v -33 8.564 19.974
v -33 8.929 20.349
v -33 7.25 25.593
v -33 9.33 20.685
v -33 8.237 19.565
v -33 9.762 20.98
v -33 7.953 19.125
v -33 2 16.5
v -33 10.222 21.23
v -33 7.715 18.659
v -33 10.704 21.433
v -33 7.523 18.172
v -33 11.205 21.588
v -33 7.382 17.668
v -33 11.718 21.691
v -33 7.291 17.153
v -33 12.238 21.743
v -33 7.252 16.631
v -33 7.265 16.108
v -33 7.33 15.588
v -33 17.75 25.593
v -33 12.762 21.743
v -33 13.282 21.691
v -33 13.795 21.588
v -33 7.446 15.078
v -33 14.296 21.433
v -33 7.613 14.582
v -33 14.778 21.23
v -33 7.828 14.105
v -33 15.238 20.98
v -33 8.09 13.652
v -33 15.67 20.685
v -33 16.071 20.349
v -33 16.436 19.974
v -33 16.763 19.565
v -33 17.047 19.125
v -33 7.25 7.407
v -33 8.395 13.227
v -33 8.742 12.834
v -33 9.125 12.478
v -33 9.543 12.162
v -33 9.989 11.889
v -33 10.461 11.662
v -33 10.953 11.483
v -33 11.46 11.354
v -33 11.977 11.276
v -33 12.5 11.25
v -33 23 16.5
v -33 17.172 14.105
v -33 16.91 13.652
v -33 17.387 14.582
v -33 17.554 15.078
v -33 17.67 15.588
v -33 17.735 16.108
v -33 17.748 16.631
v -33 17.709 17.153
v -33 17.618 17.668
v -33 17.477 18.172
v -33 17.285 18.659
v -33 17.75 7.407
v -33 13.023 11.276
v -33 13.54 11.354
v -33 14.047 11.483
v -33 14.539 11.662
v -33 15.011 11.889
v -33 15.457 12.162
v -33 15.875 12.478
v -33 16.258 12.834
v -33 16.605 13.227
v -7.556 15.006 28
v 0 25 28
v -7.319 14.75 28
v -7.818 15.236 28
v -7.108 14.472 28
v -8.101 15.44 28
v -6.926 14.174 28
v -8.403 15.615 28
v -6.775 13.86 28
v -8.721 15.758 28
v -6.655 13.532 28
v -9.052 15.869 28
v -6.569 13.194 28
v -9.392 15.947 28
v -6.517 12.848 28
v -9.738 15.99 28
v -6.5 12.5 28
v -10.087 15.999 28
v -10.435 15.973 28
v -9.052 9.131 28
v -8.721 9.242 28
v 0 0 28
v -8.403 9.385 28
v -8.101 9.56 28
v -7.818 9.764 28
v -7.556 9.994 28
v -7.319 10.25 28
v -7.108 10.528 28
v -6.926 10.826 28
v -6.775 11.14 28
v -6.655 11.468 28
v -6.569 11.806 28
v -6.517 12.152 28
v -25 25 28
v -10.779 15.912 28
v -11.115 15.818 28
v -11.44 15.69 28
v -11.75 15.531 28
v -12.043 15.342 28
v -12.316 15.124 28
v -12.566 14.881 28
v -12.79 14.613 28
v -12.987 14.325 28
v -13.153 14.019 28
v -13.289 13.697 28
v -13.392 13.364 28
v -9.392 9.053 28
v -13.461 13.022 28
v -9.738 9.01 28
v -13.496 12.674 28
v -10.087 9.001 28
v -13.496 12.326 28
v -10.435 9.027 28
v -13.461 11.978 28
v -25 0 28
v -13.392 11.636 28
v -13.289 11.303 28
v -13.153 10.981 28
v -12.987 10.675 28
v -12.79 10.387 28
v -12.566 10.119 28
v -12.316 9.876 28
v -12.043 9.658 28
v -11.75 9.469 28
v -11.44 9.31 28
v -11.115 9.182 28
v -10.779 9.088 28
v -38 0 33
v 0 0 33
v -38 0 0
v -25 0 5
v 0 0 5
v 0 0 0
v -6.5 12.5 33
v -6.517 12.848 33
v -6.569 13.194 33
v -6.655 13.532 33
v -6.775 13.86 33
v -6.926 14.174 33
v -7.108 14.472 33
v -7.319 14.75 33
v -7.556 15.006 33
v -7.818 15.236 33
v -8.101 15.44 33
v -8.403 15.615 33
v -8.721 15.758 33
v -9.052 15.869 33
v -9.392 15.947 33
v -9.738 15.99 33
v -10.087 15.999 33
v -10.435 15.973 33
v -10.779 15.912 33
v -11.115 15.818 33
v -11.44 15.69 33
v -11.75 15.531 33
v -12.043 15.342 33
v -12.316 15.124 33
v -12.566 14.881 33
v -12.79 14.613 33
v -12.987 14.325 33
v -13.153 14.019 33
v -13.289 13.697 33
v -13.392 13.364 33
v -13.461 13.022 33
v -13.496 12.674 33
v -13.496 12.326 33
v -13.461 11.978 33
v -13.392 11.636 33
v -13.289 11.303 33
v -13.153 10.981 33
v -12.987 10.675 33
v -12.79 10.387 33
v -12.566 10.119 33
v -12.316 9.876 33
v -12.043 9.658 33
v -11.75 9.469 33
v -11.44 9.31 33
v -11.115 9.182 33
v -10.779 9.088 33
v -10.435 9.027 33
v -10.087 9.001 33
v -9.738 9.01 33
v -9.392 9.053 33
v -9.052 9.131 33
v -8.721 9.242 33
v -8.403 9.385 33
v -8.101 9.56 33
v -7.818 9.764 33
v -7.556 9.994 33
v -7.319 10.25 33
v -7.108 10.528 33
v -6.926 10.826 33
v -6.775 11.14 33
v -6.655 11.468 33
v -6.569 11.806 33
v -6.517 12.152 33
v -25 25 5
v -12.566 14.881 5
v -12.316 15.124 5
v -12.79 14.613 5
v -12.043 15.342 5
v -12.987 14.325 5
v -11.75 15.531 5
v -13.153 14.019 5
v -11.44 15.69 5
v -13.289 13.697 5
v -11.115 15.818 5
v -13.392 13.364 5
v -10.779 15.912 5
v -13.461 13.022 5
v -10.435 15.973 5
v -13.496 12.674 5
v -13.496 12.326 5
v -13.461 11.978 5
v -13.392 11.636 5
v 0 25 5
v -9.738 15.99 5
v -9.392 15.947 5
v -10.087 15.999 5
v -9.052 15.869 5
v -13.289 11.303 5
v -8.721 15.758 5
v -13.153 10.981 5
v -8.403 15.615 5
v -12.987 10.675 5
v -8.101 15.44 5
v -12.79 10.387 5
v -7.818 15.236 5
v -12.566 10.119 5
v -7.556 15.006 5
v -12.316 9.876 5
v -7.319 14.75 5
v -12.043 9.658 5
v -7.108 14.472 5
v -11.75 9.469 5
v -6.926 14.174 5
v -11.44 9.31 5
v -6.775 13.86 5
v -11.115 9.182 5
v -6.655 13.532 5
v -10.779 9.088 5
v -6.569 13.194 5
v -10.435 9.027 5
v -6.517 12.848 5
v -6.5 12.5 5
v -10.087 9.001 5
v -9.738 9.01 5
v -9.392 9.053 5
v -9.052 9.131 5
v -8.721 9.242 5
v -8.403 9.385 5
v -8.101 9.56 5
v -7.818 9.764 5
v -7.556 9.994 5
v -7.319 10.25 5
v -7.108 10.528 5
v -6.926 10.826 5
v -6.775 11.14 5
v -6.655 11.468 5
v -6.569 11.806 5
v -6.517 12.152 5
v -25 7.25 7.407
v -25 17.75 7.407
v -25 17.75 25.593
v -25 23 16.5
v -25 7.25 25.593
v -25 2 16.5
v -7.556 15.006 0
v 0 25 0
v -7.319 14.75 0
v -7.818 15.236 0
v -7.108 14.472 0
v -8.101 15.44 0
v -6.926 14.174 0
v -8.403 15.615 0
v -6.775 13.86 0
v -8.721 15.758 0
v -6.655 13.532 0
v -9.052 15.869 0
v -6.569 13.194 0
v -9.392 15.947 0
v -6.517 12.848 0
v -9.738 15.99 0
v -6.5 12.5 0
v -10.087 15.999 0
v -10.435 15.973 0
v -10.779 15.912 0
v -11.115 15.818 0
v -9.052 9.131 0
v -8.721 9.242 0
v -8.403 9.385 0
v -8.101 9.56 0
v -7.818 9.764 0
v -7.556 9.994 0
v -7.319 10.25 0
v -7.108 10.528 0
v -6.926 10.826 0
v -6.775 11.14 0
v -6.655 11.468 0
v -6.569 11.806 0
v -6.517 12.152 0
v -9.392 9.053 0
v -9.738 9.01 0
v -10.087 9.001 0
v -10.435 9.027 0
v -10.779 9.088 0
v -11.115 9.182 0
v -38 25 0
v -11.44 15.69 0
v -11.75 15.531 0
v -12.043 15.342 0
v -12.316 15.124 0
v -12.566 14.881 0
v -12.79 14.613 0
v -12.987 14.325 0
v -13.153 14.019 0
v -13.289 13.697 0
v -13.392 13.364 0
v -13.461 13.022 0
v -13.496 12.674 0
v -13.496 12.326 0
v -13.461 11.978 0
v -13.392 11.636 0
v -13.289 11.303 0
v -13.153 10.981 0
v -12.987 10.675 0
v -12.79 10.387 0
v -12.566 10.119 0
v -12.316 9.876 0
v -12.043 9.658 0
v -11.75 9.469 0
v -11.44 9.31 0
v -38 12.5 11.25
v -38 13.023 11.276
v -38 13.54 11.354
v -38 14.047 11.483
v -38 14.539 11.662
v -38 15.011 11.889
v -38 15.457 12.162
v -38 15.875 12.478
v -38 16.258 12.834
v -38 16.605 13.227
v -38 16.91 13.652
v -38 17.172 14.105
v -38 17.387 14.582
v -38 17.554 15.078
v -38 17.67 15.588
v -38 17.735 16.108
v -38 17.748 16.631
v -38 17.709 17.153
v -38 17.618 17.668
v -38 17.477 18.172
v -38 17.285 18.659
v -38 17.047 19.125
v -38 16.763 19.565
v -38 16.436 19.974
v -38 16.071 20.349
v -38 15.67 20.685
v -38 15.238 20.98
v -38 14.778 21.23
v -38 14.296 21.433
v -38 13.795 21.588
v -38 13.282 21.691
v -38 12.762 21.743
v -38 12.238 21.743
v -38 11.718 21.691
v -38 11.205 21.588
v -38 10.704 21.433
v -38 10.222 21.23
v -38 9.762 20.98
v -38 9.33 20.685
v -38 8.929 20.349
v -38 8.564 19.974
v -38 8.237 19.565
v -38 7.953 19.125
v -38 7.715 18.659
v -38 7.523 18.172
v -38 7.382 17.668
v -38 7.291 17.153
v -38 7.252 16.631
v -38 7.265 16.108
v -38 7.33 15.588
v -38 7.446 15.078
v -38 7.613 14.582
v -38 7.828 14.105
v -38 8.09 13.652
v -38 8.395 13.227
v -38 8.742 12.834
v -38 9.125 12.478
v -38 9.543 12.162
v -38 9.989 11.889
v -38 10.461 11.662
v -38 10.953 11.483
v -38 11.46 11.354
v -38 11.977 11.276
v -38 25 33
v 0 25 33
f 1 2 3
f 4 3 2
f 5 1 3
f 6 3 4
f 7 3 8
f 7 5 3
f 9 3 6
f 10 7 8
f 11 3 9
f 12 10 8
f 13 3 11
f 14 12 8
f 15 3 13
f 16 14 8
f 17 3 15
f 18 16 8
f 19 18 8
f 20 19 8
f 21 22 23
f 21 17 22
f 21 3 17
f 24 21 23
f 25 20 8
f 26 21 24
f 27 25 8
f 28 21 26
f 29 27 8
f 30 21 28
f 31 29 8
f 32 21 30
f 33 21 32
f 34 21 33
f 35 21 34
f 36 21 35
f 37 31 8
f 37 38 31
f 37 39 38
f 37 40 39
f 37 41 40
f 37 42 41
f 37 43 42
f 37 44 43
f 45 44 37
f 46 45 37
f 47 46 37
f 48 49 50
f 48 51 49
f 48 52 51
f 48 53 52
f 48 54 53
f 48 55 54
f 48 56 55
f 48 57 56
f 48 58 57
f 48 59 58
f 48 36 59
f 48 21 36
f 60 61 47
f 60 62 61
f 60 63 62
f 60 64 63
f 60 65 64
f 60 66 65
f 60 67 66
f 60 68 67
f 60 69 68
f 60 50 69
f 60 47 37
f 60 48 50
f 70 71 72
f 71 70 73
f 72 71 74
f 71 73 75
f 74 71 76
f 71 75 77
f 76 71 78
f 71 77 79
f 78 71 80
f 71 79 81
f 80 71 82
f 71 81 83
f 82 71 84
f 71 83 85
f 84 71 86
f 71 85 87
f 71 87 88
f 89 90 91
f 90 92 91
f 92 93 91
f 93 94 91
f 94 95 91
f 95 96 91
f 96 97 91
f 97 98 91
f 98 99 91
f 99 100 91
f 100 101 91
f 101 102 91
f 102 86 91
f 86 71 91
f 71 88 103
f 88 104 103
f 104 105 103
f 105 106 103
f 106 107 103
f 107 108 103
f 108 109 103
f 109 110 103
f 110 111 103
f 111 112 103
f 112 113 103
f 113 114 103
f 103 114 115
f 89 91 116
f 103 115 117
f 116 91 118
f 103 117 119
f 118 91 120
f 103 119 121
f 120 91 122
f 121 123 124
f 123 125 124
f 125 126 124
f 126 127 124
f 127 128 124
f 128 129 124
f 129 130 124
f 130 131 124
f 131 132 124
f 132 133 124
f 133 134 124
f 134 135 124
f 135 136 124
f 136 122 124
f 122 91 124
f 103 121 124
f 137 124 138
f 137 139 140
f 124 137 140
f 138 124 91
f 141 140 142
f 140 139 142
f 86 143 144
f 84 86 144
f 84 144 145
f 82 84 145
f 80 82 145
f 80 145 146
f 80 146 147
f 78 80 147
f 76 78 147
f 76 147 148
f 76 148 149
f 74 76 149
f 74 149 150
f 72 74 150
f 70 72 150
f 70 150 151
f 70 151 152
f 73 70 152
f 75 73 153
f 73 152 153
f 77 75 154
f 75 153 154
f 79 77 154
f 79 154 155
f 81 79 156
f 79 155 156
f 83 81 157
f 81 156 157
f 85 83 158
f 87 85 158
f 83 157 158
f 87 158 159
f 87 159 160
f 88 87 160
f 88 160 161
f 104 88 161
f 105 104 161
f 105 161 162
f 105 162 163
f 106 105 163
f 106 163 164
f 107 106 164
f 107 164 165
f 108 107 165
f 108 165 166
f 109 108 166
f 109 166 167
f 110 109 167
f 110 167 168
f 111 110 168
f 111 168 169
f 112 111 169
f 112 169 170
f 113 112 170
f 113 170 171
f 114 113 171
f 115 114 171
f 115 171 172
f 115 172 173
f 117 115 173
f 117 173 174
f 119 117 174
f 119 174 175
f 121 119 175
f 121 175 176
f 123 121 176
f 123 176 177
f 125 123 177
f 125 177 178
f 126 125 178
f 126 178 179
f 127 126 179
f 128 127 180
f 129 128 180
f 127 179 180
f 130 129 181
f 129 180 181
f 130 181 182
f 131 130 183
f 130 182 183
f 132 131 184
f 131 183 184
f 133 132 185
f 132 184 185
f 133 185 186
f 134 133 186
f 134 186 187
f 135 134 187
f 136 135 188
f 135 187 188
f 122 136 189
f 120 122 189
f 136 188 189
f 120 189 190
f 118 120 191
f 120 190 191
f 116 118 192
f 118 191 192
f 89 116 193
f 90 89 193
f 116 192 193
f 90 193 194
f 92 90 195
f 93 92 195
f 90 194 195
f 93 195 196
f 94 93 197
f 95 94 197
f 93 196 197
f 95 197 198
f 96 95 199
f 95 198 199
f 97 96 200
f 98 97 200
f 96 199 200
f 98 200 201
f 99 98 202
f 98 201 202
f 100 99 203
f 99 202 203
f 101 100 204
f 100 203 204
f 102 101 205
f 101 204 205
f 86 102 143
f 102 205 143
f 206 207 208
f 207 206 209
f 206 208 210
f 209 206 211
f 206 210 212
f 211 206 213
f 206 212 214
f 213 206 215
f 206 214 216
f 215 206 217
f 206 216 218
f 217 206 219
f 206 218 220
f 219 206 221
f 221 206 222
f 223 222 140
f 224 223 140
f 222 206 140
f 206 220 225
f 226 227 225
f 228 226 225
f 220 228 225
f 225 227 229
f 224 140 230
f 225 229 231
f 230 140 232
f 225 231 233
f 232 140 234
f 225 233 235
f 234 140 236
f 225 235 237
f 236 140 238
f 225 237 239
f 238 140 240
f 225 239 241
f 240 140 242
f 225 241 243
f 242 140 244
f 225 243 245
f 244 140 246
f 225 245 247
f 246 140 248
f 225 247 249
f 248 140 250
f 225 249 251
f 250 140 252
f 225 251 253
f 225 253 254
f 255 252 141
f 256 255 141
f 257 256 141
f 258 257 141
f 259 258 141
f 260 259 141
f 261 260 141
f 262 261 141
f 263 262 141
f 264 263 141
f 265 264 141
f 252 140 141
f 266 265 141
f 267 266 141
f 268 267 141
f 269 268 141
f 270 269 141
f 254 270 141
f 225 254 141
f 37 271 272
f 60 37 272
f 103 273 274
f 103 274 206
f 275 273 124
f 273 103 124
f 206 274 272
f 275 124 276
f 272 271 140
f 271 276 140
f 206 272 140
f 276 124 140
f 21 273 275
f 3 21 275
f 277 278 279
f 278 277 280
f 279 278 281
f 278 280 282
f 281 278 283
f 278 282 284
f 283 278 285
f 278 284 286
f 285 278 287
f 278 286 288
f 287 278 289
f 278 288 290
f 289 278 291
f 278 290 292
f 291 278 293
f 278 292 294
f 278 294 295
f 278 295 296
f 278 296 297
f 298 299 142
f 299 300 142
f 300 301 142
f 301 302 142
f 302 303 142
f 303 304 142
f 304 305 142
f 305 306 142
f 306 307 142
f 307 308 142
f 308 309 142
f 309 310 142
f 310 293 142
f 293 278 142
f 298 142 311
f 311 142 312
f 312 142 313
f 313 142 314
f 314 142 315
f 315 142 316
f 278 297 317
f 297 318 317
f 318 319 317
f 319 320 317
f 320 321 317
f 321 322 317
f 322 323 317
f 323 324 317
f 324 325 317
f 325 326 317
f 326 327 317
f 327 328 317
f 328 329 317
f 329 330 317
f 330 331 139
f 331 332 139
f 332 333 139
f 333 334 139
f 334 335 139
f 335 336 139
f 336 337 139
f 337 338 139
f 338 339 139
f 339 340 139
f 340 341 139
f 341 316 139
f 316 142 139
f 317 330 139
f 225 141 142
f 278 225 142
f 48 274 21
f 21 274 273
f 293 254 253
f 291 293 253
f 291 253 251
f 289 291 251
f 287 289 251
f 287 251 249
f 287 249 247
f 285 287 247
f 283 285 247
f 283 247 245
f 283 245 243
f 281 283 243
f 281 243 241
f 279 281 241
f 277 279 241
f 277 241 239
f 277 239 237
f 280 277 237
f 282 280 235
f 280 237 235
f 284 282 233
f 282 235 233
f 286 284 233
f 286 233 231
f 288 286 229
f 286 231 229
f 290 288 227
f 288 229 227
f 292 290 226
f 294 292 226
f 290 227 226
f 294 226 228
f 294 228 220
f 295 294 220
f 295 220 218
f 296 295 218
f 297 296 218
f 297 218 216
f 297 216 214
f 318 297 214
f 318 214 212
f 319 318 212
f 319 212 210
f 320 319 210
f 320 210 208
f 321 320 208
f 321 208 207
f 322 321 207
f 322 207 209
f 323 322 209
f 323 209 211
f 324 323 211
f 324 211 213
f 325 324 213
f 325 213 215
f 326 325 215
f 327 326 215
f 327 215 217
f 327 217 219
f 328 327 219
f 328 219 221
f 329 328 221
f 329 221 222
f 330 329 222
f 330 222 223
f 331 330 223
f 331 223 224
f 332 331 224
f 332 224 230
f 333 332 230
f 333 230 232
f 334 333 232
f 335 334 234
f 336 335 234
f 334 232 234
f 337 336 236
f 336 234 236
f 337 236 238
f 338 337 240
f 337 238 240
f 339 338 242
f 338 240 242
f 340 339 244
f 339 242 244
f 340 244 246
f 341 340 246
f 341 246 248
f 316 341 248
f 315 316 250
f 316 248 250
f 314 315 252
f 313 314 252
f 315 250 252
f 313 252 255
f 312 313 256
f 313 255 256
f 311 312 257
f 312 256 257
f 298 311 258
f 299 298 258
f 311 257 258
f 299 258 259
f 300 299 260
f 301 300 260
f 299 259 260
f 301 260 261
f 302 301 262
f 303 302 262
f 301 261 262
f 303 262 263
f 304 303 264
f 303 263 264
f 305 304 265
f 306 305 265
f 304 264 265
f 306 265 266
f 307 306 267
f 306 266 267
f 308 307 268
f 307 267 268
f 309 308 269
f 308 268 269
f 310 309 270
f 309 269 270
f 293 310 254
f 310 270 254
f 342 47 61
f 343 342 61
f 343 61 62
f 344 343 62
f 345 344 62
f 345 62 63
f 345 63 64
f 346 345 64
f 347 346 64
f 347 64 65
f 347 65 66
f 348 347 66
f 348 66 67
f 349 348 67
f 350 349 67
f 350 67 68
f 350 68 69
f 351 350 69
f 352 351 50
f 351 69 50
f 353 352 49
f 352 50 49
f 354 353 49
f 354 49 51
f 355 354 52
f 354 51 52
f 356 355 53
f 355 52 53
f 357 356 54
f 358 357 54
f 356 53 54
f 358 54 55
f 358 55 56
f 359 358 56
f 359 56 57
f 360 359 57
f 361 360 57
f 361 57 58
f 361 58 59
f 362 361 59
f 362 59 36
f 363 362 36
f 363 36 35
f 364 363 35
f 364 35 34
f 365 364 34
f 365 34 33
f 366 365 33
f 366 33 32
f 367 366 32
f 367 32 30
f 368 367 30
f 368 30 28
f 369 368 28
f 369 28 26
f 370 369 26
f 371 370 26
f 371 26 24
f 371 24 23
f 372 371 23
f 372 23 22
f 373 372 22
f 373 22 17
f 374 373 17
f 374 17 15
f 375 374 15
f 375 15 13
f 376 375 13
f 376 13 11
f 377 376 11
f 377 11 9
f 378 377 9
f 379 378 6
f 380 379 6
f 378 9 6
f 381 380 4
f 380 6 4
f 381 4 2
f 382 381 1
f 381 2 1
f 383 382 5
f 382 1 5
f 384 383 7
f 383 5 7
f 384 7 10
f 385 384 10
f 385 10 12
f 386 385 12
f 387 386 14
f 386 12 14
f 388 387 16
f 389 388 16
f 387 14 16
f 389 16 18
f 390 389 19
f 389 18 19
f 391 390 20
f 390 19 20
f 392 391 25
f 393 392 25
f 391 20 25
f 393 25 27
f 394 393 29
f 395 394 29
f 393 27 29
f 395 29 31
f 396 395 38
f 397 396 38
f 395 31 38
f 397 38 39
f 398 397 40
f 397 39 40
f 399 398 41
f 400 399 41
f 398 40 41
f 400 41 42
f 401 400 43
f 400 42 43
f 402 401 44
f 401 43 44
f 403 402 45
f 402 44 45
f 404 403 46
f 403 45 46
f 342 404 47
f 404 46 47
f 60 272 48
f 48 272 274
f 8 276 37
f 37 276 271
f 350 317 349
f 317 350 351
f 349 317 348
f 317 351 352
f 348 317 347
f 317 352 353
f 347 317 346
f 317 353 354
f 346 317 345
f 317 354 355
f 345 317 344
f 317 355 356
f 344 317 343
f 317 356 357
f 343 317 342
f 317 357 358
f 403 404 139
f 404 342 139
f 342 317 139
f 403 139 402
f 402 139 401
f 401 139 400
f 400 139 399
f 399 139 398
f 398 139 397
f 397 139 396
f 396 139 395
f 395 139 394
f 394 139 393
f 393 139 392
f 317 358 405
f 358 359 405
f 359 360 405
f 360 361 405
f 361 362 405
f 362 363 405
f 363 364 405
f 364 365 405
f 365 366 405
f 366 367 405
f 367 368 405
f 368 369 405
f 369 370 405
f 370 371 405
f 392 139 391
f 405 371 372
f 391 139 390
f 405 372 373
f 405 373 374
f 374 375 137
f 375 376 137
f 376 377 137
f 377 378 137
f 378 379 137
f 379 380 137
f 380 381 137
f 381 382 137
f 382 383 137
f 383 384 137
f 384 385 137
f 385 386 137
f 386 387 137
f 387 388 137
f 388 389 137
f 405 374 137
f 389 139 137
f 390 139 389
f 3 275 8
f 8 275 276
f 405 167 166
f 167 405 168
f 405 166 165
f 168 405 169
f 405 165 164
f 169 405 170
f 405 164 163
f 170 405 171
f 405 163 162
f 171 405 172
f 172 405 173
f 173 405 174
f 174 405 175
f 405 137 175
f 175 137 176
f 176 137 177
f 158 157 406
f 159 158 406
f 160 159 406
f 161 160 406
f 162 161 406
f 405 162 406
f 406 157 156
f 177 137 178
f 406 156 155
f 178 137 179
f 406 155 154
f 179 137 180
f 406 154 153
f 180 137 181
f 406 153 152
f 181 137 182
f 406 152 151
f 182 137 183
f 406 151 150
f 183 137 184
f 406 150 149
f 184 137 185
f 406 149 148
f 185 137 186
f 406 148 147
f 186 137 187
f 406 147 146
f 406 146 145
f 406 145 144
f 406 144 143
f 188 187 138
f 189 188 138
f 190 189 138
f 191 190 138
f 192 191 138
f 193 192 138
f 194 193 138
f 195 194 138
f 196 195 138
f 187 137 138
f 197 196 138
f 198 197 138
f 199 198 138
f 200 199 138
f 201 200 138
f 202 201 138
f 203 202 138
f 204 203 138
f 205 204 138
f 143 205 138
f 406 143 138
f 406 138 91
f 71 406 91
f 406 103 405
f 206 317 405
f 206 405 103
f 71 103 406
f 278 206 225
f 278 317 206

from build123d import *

# Parameters (mm, degrees)
BOSS_EXTRU_1_DEPTH      = 25
ESQUISSE3_R             = 3.5
ENL_V_MAT_EXTRU_1_DEPTH = 57.196085273
ESQUISSE4_R             = 5.25
ENL_V_MAT_EXTRU_2_DEPTH = 49.363209157
ENL_V_MAT_EXTRU_3_DEPTH = 8


with BuildPart() as part:
    # Esquisse2 → Boss.-Extru.1 (new body)
    with BuildSketch(Plane(origin=(0, 0, 0), x_dir=(1, 0, 0), z_dir=(0, 1, 0))):
        Polygon((0, 0), (-38, 0), (-38, -33), (0, -33), (0, -28), (-25, -28), (-25, -5), (0, -5), align=None)
    extrude(amount=BOSS_EXTRU_1_DEPTH)

    # Esquisse3 → Enlèv. mat.-Extru.1 (cut, through all)
    with BuildSketch(Plane.XY.offset(33)):
        with Locations((-10, 12.5)):
            Circle(ESQUISSE3_R)
    extrude(amount=-ENL_V_MAT_EXTRU_1_DEPTH, mode=Mode.SUBTRACT)

    # Esquisse4 → Enlèv. mat.-Extru.2 (cut, through all)
    with BuildSketch(Plane(origin=(-25, 0, 0), x_dir=(0, 0, -1), z_dir=(1, 0, 0))):
        with Locations((-16.5, 12.5)):
            Circle(ESQUISSE4_R)
    extrude(amount=-ENL_V_MAT_EXTRU_2_DEPTH, mode=Mode.SUBTRACT)

    # Esquisse5 → Enlèv. mat.-Extru.3 (cut)
    with BuildSketch(Plane(origin=(-25, 0, 0), x_dir=(0, 0, -1), z_dir=(1, 0, 0))):
        Polygon((-7.40673326, 17.75), (-16.5, 23), (-25.59326674, 17.75), (-25.59326674, 7.25), (-16.5, 2), (-7.40673326, 7.25), align=None)
    extrude(amount=-ENL_V_MAT_EXTRU_3_DEPTH, mode=Mode.SUBTRACT)


solid = part.part
